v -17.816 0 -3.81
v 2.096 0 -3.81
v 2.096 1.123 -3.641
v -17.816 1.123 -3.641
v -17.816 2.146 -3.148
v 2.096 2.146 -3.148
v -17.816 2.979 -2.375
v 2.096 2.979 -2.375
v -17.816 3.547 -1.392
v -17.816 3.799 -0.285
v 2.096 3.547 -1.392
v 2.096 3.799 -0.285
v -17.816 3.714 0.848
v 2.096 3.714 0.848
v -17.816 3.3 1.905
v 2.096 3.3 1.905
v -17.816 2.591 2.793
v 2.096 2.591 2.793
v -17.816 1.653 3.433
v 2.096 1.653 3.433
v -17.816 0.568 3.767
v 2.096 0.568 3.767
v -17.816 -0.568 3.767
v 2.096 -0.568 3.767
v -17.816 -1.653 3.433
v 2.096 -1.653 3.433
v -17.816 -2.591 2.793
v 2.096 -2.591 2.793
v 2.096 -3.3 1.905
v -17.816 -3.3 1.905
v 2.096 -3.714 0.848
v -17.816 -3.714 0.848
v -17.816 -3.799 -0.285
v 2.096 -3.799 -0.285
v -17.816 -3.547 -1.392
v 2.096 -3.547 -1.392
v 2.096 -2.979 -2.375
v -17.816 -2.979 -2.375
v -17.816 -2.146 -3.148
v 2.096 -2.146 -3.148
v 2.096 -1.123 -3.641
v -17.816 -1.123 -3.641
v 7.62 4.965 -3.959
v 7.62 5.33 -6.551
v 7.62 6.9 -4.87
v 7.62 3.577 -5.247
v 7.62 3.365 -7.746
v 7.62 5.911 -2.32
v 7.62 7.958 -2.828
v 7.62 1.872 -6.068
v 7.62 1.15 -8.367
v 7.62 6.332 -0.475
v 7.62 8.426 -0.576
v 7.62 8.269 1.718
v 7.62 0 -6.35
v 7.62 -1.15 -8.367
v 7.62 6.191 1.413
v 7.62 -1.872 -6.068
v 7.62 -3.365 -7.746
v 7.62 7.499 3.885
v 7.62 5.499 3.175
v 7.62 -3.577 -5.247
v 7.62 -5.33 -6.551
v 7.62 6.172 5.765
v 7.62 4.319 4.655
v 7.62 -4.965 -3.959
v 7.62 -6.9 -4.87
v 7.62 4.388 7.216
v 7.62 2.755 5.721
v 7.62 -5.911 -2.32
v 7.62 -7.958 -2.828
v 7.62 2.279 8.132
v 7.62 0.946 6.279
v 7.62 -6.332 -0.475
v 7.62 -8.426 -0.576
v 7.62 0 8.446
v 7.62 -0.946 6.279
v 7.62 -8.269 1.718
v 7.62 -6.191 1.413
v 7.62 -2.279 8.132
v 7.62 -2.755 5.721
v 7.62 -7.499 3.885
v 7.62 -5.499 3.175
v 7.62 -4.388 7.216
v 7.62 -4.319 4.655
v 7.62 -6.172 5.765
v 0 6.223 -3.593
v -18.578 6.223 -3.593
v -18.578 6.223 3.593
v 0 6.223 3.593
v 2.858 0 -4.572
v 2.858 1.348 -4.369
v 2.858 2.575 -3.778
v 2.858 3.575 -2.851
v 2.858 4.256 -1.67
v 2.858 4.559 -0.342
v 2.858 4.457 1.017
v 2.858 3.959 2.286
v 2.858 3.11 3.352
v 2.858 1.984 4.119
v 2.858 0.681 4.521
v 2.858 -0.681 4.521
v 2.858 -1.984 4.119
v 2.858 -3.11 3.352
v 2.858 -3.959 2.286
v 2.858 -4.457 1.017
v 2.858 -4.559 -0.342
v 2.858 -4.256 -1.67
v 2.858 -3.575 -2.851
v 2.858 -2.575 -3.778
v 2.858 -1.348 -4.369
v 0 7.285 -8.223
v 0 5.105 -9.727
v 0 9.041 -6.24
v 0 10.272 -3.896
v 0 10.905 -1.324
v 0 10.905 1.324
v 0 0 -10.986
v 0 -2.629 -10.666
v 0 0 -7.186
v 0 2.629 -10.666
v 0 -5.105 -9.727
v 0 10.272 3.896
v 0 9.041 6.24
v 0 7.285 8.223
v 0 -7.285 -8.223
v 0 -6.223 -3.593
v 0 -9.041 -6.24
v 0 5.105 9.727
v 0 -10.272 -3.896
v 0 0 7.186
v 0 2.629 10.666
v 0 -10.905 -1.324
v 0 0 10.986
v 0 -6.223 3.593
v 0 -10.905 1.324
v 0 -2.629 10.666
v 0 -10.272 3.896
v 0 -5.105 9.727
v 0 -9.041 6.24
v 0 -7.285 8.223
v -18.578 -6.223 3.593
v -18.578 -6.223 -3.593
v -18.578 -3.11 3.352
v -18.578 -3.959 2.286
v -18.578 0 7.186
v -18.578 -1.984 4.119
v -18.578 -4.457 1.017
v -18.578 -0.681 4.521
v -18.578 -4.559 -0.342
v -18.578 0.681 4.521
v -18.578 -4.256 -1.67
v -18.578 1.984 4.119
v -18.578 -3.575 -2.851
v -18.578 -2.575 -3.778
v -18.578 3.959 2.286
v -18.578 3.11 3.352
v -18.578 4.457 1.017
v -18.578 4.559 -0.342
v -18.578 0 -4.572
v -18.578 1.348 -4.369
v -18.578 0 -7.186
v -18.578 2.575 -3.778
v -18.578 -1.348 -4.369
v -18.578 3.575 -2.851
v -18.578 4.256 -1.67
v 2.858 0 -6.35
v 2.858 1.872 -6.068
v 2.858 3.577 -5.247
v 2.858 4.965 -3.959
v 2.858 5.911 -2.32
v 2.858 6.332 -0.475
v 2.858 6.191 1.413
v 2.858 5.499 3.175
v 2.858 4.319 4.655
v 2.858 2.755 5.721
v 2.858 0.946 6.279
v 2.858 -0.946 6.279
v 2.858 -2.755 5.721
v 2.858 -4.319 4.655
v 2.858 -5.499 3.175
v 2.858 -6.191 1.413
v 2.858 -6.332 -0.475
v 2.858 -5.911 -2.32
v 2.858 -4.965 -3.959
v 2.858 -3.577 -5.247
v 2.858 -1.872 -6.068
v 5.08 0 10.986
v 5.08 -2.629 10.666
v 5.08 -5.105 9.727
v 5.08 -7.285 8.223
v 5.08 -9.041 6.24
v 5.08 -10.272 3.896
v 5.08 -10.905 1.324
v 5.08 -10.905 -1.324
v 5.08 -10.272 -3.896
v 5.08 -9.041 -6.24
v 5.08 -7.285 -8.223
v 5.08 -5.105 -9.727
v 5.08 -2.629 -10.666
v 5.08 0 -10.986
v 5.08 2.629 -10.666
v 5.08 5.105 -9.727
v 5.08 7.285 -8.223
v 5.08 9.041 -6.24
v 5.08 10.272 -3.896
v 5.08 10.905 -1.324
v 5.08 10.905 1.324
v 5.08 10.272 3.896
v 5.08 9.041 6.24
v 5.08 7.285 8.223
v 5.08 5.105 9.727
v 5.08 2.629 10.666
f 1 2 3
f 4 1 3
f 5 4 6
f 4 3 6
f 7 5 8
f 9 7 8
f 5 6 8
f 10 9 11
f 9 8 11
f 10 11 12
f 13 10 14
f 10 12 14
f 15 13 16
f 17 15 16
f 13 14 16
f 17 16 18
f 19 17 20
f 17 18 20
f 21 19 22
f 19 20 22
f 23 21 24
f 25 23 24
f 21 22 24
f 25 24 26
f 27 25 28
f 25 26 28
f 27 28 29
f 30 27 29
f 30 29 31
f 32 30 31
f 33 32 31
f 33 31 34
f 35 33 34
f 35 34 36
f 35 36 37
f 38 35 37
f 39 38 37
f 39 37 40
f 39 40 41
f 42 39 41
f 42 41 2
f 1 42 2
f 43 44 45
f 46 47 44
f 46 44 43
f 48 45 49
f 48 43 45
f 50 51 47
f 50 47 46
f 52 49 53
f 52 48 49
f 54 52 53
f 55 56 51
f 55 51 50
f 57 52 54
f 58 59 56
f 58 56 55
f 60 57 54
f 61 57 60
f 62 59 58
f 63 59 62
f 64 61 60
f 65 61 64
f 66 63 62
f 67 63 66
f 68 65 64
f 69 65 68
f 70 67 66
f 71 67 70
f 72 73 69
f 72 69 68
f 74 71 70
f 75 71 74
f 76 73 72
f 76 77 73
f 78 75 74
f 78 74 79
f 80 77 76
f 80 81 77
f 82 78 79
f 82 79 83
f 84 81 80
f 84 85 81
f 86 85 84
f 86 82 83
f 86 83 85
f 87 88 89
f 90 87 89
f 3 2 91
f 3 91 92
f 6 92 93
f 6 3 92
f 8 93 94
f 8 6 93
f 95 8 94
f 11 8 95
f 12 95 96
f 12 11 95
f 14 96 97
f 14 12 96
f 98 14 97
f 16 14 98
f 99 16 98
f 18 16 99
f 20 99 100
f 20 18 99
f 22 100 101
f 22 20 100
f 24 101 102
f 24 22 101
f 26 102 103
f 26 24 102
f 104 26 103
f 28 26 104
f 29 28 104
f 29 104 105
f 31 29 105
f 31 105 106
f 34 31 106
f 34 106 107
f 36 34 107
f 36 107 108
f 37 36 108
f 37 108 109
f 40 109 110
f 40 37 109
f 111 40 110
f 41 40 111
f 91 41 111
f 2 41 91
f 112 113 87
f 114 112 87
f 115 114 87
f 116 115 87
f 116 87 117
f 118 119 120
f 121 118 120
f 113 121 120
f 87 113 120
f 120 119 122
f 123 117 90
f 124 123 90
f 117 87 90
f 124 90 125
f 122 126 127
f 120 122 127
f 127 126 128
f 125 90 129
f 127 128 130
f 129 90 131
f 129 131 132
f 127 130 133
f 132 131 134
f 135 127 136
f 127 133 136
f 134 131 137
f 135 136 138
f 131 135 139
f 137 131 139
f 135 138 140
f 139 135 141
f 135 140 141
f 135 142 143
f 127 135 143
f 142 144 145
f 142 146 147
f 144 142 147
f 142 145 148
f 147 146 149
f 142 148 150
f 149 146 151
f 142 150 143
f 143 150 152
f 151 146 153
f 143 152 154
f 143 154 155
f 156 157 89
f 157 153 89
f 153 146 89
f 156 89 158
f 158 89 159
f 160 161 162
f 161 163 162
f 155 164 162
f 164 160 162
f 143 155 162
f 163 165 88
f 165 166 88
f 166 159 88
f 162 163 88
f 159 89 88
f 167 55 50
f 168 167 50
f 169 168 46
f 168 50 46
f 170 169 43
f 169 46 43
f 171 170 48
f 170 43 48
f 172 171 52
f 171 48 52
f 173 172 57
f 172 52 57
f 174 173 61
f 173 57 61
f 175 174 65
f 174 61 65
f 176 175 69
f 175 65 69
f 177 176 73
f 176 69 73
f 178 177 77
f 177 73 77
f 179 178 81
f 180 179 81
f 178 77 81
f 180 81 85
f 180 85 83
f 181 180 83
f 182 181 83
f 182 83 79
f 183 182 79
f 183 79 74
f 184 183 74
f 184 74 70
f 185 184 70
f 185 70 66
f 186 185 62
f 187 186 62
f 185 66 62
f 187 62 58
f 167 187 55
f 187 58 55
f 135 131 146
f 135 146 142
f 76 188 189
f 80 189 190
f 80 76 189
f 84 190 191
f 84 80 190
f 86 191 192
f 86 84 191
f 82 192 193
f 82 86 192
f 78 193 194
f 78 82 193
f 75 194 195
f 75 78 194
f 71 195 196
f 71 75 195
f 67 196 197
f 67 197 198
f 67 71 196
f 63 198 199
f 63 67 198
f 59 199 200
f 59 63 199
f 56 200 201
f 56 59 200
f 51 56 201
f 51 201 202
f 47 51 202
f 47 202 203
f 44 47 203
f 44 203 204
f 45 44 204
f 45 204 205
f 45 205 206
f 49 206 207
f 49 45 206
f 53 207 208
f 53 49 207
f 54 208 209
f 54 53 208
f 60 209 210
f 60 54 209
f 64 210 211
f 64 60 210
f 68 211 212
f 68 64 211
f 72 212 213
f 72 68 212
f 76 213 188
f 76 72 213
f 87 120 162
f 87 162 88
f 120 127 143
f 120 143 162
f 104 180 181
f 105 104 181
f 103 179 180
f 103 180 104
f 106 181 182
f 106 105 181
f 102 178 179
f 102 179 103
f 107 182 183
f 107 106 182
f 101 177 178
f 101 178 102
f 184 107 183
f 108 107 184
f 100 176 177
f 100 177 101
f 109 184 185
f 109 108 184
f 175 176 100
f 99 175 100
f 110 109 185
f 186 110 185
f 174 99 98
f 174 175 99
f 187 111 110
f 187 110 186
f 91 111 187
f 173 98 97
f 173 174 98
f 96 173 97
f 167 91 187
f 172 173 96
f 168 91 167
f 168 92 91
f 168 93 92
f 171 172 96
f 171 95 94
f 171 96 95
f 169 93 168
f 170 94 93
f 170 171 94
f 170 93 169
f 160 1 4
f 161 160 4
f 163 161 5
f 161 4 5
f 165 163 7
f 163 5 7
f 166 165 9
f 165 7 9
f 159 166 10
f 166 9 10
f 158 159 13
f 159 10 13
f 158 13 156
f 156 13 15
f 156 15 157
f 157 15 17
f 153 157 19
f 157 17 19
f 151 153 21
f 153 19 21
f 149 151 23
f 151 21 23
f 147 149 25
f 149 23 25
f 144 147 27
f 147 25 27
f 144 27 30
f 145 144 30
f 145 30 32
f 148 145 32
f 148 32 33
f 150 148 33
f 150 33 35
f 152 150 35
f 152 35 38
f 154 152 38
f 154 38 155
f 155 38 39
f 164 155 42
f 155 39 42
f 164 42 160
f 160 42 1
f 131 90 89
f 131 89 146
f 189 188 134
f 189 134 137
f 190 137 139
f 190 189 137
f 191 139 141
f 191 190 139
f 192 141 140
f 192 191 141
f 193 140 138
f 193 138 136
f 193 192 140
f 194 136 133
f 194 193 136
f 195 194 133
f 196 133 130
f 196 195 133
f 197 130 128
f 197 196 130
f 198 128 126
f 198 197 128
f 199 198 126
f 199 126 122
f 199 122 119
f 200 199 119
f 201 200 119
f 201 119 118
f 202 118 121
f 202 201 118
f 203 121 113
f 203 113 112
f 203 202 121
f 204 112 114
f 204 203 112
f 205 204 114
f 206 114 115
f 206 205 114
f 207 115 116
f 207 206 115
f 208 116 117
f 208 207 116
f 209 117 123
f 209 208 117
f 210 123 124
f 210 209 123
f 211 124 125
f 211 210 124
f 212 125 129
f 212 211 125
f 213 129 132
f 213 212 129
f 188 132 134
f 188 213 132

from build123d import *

# Parameters (mm, degrees)
SKETCH1_R           = 3.81
BOSS_EXTRUDE1_DEPTH = 18.5775
BOSS_EXTRUDE2_START = 7.62
SKETCH2_R           = 10.9855
SKETCH2_R_2         = 3.81
BOSS_EXTRUDE2_DEPTH = 7.62
SKETCH3_R           = 6.35
CUT_EXTRUDE1_DEPTH  = 4.7625
CHAMFER1_SIZE       = 2.54
CHAMFER2_SIZE       = 0.762


with BuildPart() as part:
    # Sketch1 → Boss-Extrude1 (new body)
    with BuildSketch(Plane(origin=(0, 0, 0), x_dir=(0, 0, -1), z_dir=(1, 0, 0))):
        Polygon((3.592850725, 6.223), (-3.592850725, 6.223), (-7.18570145, 0), (-3.592850725, -6.223), (3.592850725, -6.223), (7.18570145, 0), align=None)
        Circle(SKETCH1_R, mode=Mode.SUBTRACT)
    extrude(amount=-BOSS_EXTRUDE1_DEPTH)

    # Sketch2 → Boss-Extrude2 (add)
    with BuildSketch(Plane(origin=(0, 0, 0), x_dir=(0, 0, -1), z_dir=(1, 0, 0)).offset(BOSS_EXTRUDE2_START)):
        with Locations(Location((0, 0, 0), (0, 0, 180))):
            Circle(SKETCH2_R)
        Circle(SKETCH2_R_2, mode=Mode.SUBTRACT)
    extrude(amount=-BOSS_EXTRUDE2_DEPTH)

    # Sketch3 → Cut-Extrude1 (cut)
    with BuildSketch(Plane(origin=(7.62, 0, 0), x_dir=(0, 0, -1), z_dir=(1, 0, 0))):
        Circle(SKETCH3_R)
    extrude(amount=-CUT_EXTRUDE1_DEPTH, mode=Mode.SUBTRACT)

    # Chamfer1
    chamfer1_edges = [part.edges().sort_by_distance(p)[0] for p in [
        (7.62, 0, -10.9855),
    ]]
    chamfer(chamfer1_edges, length=CHAMFER1_SIZE)

    # Chamfer2
    chamfer2_edges = [part.edges().sort_by_distance(p)[0] for p in [
        (2.8575, 0, 3.81),
        (-18.5775, 0, 3.81),
    ]]
    chamfer(chamfer2_edges, length=CHAMFER2_SIZE)


solid = part.part
